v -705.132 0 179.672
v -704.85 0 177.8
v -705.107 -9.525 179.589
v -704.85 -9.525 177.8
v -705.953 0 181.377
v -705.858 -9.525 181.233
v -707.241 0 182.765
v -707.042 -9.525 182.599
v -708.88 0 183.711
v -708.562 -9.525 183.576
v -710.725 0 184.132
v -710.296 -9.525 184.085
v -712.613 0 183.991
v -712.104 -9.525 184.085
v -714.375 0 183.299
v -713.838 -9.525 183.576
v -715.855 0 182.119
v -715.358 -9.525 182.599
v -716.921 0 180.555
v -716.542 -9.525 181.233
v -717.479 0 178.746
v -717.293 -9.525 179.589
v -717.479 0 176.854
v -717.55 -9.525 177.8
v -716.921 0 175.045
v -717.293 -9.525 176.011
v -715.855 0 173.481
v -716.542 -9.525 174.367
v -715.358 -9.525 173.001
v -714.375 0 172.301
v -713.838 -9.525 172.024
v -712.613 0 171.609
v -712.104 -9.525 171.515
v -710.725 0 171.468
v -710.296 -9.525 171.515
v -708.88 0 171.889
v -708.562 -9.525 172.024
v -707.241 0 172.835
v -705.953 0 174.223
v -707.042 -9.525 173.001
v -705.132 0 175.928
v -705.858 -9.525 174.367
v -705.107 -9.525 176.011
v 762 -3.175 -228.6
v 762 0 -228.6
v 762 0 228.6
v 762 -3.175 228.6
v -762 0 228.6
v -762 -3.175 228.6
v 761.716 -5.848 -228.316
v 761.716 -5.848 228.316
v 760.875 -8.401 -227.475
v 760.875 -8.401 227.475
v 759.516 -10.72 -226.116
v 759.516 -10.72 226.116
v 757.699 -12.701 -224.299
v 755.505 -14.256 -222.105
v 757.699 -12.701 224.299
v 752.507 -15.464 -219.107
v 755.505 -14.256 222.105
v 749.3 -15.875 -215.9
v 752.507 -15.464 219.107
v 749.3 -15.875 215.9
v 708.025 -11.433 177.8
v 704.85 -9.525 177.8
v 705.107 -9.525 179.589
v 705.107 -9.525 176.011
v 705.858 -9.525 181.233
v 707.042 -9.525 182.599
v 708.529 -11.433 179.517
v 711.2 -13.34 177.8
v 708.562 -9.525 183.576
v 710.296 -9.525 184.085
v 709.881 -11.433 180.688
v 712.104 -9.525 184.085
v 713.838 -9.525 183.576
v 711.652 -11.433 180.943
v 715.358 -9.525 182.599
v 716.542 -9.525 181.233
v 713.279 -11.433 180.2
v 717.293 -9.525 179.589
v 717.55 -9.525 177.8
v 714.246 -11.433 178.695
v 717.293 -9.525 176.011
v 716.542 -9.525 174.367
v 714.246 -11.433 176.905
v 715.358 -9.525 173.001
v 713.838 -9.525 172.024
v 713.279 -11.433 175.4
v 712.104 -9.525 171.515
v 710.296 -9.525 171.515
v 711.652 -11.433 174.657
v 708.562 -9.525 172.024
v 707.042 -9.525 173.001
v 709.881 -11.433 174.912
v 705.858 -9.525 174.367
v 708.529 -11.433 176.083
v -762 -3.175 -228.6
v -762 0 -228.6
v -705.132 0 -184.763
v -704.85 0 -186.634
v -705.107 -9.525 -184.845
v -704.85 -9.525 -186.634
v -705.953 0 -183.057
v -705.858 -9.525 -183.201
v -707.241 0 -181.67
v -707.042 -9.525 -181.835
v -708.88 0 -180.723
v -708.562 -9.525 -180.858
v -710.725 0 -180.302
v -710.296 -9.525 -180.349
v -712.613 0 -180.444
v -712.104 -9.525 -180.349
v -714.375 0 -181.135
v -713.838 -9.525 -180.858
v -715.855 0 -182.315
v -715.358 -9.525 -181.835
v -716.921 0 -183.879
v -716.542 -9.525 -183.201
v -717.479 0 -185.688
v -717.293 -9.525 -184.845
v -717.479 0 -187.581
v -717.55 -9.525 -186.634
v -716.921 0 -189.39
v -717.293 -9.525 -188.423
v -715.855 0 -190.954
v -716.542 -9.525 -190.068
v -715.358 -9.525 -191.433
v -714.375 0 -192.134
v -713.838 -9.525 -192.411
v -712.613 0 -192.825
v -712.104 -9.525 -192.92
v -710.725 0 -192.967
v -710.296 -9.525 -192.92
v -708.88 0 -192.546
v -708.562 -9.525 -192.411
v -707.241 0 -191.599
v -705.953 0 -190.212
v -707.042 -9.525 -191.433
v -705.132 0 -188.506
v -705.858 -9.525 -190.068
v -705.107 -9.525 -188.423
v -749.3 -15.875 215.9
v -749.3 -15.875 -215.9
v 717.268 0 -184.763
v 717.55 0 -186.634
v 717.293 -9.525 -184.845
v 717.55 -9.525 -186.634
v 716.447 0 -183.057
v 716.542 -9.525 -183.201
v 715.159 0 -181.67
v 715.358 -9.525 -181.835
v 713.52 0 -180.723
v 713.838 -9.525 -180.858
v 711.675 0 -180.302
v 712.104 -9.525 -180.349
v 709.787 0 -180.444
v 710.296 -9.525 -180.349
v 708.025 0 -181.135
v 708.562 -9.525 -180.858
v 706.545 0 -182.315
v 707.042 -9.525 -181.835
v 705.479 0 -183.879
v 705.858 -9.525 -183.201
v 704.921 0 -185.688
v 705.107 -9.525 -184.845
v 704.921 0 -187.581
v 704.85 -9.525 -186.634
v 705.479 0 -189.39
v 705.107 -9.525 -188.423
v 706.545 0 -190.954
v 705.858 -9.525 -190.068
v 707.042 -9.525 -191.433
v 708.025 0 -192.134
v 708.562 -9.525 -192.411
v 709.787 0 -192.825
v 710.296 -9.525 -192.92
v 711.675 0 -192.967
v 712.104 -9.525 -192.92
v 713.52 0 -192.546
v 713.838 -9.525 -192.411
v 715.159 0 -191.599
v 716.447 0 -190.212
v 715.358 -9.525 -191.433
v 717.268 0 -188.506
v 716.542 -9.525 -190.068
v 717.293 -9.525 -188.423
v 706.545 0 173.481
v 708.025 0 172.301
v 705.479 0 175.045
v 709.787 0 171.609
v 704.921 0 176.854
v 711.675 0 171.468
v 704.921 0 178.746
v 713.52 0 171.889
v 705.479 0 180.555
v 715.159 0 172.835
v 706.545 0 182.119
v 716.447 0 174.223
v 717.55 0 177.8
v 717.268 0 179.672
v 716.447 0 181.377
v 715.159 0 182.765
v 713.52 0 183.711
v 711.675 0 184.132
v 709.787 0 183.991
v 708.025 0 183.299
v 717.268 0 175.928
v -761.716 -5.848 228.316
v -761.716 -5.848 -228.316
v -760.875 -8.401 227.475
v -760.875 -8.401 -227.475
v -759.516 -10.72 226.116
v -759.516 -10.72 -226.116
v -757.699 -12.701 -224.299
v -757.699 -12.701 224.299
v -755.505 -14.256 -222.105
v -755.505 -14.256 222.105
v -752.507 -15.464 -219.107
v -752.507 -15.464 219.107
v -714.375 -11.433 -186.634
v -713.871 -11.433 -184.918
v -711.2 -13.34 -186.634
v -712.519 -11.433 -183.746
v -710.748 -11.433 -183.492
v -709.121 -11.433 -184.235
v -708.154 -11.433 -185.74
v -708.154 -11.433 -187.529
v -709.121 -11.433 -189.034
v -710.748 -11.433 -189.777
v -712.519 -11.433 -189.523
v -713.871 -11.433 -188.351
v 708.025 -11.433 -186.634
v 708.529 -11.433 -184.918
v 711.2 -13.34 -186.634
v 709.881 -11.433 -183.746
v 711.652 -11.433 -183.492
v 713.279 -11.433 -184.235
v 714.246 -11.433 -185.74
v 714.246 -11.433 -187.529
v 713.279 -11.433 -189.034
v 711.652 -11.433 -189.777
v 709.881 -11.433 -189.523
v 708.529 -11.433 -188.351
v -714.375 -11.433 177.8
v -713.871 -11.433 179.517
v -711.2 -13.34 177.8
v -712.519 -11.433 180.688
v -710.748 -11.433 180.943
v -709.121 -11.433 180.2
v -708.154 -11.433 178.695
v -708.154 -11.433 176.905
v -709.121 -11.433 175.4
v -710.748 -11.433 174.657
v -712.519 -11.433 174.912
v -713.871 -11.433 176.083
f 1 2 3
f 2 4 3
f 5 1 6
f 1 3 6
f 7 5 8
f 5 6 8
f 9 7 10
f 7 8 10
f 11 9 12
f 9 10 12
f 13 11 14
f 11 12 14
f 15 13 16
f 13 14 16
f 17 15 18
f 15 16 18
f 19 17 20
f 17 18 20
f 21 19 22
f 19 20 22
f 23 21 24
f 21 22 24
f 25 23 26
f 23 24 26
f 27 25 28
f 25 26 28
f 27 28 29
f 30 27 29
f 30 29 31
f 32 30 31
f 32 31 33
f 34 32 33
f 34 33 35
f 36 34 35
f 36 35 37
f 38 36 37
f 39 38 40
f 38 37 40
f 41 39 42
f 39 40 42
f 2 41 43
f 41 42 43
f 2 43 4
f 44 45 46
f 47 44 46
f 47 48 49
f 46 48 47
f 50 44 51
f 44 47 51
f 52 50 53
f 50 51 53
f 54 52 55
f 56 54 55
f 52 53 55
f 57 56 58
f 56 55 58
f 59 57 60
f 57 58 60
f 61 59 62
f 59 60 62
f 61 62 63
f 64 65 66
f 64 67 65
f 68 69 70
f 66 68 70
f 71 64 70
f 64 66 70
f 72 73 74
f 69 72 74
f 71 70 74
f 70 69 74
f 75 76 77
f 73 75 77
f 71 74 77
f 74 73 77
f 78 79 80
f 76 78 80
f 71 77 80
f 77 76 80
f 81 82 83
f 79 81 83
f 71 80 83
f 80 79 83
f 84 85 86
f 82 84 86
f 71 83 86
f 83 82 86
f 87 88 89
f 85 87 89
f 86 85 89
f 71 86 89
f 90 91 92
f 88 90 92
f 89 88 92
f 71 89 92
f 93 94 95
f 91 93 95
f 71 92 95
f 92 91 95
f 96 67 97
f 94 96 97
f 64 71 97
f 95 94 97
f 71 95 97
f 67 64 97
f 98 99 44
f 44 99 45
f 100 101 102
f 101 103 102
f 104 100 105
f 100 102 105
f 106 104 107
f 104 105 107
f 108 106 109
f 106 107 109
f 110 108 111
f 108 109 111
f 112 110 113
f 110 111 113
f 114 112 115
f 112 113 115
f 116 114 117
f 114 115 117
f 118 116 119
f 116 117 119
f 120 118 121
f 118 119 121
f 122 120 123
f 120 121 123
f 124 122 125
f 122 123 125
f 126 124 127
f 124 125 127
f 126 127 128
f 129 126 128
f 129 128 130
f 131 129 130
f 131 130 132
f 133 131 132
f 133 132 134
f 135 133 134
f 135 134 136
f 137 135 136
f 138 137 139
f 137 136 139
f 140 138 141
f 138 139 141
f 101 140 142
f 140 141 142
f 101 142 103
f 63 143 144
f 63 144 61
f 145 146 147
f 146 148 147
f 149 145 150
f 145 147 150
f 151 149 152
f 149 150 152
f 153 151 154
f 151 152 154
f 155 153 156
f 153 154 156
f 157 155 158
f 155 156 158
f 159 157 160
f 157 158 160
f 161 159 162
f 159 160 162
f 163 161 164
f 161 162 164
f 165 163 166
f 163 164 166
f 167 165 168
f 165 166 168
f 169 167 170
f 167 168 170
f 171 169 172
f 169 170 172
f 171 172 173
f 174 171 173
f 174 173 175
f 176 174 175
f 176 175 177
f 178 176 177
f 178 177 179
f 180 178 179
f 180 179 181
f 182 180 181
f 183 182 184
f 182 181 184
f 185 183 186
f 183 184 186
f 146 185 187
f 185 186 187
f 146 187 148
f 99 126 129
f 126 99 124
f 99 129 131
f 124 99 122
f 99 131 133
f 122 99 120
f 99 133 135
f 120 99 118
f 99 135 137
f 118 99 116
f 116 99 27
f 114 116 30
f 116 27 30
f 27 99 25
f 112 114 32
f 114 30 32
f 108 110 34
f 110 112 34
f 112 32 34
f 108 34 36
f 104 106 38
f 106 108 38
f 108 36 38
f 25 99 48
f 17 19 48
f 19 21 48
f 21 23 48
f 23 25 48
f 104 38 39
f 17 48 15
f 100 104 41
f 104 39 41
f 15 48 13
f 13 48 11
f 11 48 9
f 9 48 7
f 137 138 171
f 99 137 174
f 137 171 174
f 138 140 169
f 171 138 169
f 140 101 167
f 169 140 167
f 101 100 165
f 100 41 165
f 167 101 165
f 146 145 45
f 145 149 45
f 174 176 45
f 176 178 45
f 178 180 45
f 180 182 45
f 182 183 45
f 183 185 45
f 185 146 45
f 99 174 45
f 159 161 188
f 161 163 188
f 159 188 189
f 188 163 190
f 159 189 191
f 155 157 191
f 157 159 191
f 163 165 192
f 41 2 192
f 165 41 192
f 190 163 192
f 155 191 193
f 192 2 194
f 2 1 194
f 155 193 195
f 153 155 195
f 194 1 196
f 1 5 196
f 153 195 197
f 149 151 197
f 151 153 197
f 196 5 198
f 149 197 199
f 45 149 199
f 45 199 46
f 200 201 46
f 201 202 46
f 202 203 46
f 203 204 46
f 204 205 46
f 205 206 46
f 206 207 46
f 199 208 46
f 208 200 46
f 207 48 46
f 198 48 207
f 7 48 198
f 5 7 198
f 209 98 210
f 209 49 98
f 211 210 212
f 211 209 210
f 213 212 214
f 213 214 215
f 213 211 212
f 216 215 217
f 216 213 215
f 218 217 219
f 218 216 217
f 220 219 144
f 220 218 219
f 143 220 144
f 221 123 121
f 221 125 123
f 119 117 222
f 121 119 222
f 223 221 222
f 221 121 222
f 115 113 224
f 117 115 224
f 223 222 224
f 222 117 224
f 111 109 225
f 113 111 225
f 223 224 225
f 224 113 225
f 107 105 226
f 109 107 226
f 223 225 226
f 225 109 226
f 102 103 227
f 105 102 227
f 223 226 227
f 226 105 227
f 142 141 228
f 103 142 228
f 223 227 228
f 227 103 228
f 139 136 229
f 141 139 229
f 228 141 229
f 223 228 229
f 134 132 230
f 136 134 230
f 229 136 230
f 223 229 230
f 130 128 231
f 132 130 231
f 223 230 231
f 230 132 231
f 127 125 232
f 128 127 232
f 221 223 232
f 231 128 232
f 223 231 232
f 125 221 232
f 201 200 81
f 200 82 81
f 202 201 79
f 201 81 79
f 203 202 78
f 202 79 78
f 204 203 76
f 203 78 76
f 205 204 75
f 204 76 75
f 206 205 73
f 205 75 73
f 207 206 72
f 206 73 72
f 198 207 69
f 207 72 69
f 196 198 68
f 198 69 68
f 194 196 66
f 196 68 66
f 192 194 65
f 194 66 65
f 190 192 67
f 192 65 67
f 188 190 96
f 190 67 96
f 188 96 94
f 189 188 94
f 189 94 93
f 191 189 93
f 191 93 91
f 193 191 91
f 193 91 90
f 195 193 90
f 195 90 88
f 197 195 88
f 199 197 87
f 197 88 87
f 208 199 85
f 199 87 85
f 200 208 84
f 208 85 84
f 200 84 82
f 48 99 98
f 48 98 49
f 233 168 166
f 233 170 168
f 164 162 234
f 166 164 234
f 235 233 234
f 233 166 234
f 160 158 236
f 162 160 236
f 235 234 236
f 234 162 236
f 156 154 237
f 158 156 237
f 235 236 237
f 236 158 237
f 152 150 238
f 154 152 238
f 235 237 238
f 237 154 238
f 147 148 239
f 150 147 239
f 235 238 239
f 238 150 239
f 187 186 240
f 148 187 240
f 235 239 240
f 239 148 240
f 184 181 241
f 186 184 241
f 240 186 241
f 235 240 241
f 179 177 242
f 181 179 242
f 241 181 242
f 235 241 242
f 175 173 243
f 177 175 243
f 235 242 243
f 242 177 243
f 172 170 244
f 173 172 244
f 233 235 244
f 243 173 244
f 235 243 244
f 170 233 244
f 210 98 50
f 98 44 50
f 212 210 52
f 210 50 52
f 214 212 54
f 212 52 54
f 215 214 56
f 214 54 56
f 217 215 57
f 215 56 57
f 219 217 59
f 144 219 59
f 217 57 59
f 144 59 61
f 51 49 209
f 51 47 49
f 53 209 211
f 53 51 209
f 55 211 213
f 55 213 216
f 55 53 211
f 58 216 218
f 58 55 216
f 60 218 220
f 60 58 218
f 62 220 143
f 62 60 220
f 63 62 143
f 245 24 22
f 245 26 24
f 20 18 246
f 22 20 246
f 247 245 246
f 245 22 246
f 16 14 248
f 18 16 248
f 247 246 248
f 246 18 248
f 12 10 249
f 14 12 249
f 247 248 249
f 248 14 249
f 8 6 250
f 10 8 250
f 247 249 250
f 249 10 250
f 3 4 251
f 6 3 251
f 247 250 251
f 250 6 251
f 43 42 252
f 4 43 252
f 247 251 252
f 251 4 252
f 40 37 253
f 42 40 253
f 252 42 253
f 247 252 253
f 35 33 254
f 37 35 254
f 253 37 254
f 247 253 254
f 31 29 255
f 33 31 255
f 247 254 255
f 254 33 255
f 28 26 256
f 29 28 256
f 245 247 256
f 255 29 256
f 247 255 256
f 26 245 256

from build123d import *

# Parameters (mm, degrees)
F0_W     = 1524
F0_H     = 457.2
F1_DEPTH = 15.875
F2_R     = 12.7
F4_D     = 12.7
F4_DEPTH = 9.525
F4_TIP   = 3.8154649308


# Not quite as in the source:
# - a length typed as a fraction of an inch, garbled in the dataset ("3 / 203.2 mm" for 3/8 in), is restored


with BuildPart() as f1:
    # F0 (on Front) → F1 (new body)
    with BuildSketch(Plane.XZ):
        Rectangle(F0_W, F0_H)
    extrude(amount=F1_DEPTH)

    # F2
    f2_edges = [f1.edges().sort_by_distance(p)[0] for p in [
        (0, -15.875, 228.6),
        (-762, -15.875, 0),
        (0, -15.875, -228.6),
        (762, -15.875, 0),
    ]]
    fillet(f2_edges, radius=F2_R)

    # F4
    with Locations(Plane(origin=(0, 0, 0), x_dir=(-1, 0, 0), z_dir=(0, 1, 0))):
        with Locations((-711.2, 177.8), (-711.2, -186.6344660521), (711.2, -186.6344660521), (711.2, 177.8)):
            Hole(F4_D / 2, depth=F4_DEPTH)
            with Locations((0, 0, -(F4_DEPTH + F4_TIP / 2))):  # 118° drill point
                Cone(0, F4_D / 2, F4_TIP, mode=Mode.SUBTRACT)


solid = f1.part
